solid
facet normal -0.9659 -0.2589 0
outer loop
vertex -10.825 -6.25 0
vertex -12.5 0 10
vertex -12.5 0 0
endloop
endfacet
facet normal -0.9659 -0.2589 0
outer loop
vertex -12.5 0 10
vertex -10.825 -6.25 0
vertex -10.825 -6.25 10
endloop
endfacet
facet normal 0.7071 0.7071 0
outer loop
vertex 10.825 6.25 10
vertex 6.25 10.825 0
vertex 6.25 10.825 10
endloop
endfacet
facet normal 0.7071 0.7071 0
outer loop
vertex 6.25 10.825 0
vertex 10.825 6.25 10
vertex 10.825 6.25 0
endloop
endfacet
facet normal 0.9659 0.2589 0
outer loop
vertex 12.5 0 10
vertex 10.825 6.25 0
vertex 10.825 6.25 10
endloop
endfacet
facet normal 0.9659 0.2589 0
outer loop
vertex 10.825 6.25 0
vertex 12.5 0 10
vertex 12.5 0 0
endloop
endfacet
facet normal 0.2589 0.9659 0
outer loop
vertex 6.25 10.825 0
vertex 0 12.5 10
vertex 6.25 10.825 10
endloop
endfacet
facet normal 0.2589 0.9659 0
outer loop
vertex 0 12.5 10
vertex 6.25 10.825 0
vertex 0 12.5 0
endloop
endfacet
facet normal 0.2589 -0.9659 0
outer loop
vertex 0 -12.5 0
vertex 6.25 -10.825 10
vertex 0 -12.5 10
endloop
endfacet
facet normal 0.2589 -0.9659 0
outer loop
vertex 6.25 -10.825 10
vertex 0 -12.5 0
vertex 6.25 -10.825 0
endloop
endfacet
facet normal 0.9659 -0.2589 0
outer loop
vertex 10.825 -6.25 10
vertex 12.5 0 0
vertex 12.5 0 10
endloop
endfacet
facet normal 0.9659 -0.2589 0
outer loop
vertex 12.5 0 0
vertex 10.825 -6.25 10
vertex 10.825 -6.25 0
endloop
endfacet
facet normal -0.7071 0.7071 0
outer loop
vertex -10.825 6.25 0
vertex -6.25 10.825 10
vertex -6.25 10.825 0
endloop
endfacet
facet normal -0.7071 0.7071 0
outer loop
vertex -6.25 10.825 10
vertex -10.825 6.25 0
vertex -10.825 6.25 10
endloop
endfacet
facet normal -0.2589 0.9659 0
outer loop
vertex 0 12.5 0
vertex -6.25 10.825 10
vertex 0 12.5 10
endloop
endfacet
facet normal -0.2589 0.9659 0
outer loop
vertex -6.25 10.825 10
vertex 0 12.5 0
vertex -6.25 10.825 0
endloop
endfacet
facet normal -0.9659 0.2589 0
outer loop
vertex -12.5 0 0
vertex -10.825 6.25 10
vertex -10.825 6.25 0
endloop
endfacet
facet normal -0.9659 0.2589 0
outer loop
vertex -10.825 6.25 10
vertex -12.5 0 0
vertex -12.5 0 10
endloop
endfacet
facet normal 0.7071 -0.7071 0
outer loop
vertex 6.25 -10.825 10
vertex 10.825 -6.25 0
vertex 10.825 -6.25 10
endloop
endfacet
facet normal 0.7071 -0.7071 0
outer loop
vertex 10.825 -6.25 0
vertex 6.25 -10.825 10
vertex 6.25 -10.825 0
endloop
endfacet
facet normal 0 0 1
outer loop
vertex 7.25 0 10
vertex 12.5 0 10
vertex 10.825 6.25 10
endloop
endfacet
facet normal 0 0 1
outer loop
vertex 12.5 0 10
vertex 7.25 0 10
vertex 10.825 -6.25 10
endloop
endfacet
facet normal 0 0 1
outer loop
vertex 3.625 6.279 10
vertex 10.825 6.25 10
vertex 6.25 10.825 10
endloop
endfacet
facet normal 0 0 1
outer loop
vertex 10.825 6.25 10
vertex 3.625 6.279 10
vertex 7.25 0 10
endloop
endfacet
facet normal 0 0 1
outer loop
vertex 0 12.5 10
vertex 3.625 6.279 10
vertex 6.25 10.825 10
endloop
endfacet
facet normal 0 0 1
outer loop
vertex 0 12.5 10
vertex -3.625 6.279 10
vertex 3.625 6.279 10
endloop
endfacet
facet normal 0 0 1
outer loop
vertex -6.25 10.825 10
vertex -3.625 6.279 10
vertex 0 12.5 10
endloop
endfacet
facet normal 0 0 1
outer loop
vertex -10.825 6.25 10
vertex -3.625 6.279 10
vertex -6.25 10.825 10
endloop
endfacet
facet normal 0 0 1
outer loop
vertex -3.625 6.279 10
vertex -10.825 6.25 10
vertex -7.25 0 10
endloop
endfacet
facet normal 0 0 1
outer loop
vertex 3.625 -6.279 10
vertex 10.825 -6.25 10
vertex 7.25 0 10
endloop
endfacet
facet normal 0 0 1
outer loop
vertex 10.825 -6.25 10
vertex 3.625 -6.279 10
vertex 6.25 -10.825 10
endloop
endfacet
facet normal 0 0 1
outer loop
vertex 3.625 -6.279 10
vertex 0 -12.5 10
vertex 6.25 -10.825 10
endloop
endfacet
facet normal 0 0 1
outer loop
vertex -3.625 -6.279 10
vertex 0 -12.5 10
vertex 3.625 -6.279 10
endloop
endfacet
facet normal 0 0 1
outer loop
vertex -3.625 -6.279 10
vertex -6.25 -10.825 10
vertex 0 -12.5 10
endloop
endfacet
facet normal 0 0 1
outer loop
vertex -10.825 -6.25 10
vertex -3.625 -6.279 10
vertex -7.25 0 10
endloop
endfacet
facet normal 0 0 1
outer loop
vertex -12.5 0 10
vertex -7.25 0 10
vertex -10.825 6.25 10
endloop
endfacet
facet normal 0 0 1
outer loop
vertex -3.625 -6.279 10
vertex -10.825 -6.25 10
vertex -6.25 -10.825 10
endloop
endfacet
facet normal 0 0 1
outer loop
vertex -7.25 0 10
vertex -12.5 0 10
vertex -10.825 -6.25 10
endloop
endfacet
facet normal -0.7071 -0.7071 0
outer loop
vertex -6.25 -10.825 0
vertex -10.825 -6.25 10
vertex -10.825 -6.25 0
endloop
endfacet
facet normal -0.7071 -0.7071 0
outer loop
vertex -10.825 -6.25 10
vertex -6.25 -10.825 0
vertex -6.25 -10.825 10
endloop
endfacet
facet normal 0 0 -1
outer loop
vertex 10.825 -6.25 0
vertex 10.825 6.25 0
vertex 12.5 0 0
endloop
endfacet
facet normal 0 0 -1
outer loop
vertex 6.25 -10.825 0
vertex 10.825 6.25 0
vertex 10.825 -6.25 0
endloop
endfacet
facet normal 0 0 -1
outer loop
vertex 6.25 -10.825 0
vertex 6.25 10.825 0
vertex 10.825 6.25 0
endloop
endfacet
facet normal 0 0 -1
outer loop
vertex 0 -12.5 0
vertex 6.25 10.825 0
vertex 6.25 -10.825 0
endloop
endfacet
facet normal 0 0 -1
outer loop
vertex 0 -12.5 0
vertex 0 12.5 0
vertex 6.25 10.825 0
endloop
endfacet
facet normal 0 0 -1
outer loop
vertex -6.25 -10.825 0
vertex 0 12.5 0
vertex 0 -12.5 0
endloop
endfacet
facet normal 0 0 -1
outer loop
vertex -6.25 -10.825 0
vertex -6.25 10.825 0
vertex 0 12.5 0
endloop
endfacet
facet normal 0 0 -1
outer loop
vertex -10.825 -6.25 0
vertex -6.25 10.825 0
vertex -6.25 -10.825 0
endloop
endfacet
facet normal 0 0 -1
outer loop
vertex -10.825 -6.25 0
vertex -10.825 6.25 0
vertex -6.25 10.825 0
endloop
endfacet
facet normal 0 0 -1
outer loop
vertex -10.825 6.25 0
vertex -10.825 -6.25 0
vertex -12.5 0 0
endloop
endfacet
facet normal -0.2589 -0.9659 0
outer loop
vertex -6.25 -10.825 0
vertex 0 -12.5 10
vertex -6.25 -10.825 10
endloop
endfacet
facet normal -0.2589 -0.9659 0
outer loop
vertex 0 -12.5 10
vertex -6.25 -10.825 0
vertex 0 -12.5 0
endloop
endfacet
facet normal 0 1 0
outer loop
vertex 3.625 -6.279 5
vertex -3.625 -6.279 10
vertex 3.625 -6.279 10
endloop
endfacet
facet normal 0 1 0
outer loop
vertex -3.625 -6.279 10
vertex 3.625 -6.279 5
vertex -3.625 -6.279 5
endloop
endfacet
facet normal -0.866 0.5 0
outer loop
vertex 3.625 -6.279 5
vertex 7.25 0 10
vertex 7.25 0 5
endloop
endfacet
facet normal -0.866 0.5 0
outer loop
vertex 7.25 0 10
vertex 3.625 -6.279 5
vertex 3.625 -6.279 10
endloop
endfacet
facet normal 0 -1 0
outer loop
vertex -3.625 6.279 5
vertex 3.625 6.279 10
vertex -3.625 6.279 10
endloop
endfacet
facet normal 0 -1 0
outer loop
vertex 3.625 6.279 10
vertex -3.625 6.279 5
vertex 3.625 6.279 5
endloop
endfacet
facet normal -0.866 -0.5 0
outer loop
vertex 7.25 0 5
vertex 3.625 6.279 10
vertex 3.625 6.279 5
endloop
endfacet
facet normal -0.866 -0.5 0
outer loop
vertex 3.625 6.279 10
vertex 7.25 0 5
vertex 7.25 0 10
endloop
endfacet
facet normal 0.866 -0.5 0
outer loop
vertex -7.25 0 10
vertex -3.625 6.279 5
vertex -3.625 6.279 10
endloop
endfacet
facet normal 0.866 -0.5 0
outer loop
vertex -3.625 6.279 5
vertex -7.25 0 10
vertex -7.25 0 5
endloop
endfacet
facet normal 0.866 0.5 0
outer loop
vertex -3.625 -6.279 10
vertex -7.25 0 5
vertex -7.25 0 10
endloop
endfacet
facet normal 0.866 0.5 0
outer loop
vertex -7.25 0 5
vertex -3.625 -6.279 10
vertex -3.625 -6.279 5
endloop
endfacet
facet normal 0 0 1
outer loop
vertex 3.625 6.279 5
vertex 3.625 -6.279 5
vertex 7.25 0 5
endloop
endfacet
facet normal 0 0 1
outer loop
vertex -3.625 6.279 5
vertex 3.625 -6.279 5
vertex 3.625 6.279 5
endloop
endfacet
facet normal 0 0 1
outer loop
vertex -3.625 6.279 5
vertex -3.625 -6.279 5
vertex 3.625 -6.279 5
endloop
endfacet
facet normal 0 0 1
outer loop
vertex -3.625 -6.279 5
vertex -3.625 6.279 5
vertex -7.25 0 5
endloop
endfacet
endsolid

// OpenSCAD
// a knob to go onto a 5/16" bolt (AMD)
// hexagonal bolt head is 12.5 mm across the flats, 14.3 mm across the corners, 5.0 mm thick

knob_diameter = 25;
head_diameter = 14.5;
head_thickness = 5;

difference() {
    cylinder(h=2*head_thickness, d=knob_diameter, center=false, $fn=12);
    translate([0, 0, head_thickness])
        cylinder(h=head_thickness+0.1, d=head_diameter, center=false, $fn=6);
}
